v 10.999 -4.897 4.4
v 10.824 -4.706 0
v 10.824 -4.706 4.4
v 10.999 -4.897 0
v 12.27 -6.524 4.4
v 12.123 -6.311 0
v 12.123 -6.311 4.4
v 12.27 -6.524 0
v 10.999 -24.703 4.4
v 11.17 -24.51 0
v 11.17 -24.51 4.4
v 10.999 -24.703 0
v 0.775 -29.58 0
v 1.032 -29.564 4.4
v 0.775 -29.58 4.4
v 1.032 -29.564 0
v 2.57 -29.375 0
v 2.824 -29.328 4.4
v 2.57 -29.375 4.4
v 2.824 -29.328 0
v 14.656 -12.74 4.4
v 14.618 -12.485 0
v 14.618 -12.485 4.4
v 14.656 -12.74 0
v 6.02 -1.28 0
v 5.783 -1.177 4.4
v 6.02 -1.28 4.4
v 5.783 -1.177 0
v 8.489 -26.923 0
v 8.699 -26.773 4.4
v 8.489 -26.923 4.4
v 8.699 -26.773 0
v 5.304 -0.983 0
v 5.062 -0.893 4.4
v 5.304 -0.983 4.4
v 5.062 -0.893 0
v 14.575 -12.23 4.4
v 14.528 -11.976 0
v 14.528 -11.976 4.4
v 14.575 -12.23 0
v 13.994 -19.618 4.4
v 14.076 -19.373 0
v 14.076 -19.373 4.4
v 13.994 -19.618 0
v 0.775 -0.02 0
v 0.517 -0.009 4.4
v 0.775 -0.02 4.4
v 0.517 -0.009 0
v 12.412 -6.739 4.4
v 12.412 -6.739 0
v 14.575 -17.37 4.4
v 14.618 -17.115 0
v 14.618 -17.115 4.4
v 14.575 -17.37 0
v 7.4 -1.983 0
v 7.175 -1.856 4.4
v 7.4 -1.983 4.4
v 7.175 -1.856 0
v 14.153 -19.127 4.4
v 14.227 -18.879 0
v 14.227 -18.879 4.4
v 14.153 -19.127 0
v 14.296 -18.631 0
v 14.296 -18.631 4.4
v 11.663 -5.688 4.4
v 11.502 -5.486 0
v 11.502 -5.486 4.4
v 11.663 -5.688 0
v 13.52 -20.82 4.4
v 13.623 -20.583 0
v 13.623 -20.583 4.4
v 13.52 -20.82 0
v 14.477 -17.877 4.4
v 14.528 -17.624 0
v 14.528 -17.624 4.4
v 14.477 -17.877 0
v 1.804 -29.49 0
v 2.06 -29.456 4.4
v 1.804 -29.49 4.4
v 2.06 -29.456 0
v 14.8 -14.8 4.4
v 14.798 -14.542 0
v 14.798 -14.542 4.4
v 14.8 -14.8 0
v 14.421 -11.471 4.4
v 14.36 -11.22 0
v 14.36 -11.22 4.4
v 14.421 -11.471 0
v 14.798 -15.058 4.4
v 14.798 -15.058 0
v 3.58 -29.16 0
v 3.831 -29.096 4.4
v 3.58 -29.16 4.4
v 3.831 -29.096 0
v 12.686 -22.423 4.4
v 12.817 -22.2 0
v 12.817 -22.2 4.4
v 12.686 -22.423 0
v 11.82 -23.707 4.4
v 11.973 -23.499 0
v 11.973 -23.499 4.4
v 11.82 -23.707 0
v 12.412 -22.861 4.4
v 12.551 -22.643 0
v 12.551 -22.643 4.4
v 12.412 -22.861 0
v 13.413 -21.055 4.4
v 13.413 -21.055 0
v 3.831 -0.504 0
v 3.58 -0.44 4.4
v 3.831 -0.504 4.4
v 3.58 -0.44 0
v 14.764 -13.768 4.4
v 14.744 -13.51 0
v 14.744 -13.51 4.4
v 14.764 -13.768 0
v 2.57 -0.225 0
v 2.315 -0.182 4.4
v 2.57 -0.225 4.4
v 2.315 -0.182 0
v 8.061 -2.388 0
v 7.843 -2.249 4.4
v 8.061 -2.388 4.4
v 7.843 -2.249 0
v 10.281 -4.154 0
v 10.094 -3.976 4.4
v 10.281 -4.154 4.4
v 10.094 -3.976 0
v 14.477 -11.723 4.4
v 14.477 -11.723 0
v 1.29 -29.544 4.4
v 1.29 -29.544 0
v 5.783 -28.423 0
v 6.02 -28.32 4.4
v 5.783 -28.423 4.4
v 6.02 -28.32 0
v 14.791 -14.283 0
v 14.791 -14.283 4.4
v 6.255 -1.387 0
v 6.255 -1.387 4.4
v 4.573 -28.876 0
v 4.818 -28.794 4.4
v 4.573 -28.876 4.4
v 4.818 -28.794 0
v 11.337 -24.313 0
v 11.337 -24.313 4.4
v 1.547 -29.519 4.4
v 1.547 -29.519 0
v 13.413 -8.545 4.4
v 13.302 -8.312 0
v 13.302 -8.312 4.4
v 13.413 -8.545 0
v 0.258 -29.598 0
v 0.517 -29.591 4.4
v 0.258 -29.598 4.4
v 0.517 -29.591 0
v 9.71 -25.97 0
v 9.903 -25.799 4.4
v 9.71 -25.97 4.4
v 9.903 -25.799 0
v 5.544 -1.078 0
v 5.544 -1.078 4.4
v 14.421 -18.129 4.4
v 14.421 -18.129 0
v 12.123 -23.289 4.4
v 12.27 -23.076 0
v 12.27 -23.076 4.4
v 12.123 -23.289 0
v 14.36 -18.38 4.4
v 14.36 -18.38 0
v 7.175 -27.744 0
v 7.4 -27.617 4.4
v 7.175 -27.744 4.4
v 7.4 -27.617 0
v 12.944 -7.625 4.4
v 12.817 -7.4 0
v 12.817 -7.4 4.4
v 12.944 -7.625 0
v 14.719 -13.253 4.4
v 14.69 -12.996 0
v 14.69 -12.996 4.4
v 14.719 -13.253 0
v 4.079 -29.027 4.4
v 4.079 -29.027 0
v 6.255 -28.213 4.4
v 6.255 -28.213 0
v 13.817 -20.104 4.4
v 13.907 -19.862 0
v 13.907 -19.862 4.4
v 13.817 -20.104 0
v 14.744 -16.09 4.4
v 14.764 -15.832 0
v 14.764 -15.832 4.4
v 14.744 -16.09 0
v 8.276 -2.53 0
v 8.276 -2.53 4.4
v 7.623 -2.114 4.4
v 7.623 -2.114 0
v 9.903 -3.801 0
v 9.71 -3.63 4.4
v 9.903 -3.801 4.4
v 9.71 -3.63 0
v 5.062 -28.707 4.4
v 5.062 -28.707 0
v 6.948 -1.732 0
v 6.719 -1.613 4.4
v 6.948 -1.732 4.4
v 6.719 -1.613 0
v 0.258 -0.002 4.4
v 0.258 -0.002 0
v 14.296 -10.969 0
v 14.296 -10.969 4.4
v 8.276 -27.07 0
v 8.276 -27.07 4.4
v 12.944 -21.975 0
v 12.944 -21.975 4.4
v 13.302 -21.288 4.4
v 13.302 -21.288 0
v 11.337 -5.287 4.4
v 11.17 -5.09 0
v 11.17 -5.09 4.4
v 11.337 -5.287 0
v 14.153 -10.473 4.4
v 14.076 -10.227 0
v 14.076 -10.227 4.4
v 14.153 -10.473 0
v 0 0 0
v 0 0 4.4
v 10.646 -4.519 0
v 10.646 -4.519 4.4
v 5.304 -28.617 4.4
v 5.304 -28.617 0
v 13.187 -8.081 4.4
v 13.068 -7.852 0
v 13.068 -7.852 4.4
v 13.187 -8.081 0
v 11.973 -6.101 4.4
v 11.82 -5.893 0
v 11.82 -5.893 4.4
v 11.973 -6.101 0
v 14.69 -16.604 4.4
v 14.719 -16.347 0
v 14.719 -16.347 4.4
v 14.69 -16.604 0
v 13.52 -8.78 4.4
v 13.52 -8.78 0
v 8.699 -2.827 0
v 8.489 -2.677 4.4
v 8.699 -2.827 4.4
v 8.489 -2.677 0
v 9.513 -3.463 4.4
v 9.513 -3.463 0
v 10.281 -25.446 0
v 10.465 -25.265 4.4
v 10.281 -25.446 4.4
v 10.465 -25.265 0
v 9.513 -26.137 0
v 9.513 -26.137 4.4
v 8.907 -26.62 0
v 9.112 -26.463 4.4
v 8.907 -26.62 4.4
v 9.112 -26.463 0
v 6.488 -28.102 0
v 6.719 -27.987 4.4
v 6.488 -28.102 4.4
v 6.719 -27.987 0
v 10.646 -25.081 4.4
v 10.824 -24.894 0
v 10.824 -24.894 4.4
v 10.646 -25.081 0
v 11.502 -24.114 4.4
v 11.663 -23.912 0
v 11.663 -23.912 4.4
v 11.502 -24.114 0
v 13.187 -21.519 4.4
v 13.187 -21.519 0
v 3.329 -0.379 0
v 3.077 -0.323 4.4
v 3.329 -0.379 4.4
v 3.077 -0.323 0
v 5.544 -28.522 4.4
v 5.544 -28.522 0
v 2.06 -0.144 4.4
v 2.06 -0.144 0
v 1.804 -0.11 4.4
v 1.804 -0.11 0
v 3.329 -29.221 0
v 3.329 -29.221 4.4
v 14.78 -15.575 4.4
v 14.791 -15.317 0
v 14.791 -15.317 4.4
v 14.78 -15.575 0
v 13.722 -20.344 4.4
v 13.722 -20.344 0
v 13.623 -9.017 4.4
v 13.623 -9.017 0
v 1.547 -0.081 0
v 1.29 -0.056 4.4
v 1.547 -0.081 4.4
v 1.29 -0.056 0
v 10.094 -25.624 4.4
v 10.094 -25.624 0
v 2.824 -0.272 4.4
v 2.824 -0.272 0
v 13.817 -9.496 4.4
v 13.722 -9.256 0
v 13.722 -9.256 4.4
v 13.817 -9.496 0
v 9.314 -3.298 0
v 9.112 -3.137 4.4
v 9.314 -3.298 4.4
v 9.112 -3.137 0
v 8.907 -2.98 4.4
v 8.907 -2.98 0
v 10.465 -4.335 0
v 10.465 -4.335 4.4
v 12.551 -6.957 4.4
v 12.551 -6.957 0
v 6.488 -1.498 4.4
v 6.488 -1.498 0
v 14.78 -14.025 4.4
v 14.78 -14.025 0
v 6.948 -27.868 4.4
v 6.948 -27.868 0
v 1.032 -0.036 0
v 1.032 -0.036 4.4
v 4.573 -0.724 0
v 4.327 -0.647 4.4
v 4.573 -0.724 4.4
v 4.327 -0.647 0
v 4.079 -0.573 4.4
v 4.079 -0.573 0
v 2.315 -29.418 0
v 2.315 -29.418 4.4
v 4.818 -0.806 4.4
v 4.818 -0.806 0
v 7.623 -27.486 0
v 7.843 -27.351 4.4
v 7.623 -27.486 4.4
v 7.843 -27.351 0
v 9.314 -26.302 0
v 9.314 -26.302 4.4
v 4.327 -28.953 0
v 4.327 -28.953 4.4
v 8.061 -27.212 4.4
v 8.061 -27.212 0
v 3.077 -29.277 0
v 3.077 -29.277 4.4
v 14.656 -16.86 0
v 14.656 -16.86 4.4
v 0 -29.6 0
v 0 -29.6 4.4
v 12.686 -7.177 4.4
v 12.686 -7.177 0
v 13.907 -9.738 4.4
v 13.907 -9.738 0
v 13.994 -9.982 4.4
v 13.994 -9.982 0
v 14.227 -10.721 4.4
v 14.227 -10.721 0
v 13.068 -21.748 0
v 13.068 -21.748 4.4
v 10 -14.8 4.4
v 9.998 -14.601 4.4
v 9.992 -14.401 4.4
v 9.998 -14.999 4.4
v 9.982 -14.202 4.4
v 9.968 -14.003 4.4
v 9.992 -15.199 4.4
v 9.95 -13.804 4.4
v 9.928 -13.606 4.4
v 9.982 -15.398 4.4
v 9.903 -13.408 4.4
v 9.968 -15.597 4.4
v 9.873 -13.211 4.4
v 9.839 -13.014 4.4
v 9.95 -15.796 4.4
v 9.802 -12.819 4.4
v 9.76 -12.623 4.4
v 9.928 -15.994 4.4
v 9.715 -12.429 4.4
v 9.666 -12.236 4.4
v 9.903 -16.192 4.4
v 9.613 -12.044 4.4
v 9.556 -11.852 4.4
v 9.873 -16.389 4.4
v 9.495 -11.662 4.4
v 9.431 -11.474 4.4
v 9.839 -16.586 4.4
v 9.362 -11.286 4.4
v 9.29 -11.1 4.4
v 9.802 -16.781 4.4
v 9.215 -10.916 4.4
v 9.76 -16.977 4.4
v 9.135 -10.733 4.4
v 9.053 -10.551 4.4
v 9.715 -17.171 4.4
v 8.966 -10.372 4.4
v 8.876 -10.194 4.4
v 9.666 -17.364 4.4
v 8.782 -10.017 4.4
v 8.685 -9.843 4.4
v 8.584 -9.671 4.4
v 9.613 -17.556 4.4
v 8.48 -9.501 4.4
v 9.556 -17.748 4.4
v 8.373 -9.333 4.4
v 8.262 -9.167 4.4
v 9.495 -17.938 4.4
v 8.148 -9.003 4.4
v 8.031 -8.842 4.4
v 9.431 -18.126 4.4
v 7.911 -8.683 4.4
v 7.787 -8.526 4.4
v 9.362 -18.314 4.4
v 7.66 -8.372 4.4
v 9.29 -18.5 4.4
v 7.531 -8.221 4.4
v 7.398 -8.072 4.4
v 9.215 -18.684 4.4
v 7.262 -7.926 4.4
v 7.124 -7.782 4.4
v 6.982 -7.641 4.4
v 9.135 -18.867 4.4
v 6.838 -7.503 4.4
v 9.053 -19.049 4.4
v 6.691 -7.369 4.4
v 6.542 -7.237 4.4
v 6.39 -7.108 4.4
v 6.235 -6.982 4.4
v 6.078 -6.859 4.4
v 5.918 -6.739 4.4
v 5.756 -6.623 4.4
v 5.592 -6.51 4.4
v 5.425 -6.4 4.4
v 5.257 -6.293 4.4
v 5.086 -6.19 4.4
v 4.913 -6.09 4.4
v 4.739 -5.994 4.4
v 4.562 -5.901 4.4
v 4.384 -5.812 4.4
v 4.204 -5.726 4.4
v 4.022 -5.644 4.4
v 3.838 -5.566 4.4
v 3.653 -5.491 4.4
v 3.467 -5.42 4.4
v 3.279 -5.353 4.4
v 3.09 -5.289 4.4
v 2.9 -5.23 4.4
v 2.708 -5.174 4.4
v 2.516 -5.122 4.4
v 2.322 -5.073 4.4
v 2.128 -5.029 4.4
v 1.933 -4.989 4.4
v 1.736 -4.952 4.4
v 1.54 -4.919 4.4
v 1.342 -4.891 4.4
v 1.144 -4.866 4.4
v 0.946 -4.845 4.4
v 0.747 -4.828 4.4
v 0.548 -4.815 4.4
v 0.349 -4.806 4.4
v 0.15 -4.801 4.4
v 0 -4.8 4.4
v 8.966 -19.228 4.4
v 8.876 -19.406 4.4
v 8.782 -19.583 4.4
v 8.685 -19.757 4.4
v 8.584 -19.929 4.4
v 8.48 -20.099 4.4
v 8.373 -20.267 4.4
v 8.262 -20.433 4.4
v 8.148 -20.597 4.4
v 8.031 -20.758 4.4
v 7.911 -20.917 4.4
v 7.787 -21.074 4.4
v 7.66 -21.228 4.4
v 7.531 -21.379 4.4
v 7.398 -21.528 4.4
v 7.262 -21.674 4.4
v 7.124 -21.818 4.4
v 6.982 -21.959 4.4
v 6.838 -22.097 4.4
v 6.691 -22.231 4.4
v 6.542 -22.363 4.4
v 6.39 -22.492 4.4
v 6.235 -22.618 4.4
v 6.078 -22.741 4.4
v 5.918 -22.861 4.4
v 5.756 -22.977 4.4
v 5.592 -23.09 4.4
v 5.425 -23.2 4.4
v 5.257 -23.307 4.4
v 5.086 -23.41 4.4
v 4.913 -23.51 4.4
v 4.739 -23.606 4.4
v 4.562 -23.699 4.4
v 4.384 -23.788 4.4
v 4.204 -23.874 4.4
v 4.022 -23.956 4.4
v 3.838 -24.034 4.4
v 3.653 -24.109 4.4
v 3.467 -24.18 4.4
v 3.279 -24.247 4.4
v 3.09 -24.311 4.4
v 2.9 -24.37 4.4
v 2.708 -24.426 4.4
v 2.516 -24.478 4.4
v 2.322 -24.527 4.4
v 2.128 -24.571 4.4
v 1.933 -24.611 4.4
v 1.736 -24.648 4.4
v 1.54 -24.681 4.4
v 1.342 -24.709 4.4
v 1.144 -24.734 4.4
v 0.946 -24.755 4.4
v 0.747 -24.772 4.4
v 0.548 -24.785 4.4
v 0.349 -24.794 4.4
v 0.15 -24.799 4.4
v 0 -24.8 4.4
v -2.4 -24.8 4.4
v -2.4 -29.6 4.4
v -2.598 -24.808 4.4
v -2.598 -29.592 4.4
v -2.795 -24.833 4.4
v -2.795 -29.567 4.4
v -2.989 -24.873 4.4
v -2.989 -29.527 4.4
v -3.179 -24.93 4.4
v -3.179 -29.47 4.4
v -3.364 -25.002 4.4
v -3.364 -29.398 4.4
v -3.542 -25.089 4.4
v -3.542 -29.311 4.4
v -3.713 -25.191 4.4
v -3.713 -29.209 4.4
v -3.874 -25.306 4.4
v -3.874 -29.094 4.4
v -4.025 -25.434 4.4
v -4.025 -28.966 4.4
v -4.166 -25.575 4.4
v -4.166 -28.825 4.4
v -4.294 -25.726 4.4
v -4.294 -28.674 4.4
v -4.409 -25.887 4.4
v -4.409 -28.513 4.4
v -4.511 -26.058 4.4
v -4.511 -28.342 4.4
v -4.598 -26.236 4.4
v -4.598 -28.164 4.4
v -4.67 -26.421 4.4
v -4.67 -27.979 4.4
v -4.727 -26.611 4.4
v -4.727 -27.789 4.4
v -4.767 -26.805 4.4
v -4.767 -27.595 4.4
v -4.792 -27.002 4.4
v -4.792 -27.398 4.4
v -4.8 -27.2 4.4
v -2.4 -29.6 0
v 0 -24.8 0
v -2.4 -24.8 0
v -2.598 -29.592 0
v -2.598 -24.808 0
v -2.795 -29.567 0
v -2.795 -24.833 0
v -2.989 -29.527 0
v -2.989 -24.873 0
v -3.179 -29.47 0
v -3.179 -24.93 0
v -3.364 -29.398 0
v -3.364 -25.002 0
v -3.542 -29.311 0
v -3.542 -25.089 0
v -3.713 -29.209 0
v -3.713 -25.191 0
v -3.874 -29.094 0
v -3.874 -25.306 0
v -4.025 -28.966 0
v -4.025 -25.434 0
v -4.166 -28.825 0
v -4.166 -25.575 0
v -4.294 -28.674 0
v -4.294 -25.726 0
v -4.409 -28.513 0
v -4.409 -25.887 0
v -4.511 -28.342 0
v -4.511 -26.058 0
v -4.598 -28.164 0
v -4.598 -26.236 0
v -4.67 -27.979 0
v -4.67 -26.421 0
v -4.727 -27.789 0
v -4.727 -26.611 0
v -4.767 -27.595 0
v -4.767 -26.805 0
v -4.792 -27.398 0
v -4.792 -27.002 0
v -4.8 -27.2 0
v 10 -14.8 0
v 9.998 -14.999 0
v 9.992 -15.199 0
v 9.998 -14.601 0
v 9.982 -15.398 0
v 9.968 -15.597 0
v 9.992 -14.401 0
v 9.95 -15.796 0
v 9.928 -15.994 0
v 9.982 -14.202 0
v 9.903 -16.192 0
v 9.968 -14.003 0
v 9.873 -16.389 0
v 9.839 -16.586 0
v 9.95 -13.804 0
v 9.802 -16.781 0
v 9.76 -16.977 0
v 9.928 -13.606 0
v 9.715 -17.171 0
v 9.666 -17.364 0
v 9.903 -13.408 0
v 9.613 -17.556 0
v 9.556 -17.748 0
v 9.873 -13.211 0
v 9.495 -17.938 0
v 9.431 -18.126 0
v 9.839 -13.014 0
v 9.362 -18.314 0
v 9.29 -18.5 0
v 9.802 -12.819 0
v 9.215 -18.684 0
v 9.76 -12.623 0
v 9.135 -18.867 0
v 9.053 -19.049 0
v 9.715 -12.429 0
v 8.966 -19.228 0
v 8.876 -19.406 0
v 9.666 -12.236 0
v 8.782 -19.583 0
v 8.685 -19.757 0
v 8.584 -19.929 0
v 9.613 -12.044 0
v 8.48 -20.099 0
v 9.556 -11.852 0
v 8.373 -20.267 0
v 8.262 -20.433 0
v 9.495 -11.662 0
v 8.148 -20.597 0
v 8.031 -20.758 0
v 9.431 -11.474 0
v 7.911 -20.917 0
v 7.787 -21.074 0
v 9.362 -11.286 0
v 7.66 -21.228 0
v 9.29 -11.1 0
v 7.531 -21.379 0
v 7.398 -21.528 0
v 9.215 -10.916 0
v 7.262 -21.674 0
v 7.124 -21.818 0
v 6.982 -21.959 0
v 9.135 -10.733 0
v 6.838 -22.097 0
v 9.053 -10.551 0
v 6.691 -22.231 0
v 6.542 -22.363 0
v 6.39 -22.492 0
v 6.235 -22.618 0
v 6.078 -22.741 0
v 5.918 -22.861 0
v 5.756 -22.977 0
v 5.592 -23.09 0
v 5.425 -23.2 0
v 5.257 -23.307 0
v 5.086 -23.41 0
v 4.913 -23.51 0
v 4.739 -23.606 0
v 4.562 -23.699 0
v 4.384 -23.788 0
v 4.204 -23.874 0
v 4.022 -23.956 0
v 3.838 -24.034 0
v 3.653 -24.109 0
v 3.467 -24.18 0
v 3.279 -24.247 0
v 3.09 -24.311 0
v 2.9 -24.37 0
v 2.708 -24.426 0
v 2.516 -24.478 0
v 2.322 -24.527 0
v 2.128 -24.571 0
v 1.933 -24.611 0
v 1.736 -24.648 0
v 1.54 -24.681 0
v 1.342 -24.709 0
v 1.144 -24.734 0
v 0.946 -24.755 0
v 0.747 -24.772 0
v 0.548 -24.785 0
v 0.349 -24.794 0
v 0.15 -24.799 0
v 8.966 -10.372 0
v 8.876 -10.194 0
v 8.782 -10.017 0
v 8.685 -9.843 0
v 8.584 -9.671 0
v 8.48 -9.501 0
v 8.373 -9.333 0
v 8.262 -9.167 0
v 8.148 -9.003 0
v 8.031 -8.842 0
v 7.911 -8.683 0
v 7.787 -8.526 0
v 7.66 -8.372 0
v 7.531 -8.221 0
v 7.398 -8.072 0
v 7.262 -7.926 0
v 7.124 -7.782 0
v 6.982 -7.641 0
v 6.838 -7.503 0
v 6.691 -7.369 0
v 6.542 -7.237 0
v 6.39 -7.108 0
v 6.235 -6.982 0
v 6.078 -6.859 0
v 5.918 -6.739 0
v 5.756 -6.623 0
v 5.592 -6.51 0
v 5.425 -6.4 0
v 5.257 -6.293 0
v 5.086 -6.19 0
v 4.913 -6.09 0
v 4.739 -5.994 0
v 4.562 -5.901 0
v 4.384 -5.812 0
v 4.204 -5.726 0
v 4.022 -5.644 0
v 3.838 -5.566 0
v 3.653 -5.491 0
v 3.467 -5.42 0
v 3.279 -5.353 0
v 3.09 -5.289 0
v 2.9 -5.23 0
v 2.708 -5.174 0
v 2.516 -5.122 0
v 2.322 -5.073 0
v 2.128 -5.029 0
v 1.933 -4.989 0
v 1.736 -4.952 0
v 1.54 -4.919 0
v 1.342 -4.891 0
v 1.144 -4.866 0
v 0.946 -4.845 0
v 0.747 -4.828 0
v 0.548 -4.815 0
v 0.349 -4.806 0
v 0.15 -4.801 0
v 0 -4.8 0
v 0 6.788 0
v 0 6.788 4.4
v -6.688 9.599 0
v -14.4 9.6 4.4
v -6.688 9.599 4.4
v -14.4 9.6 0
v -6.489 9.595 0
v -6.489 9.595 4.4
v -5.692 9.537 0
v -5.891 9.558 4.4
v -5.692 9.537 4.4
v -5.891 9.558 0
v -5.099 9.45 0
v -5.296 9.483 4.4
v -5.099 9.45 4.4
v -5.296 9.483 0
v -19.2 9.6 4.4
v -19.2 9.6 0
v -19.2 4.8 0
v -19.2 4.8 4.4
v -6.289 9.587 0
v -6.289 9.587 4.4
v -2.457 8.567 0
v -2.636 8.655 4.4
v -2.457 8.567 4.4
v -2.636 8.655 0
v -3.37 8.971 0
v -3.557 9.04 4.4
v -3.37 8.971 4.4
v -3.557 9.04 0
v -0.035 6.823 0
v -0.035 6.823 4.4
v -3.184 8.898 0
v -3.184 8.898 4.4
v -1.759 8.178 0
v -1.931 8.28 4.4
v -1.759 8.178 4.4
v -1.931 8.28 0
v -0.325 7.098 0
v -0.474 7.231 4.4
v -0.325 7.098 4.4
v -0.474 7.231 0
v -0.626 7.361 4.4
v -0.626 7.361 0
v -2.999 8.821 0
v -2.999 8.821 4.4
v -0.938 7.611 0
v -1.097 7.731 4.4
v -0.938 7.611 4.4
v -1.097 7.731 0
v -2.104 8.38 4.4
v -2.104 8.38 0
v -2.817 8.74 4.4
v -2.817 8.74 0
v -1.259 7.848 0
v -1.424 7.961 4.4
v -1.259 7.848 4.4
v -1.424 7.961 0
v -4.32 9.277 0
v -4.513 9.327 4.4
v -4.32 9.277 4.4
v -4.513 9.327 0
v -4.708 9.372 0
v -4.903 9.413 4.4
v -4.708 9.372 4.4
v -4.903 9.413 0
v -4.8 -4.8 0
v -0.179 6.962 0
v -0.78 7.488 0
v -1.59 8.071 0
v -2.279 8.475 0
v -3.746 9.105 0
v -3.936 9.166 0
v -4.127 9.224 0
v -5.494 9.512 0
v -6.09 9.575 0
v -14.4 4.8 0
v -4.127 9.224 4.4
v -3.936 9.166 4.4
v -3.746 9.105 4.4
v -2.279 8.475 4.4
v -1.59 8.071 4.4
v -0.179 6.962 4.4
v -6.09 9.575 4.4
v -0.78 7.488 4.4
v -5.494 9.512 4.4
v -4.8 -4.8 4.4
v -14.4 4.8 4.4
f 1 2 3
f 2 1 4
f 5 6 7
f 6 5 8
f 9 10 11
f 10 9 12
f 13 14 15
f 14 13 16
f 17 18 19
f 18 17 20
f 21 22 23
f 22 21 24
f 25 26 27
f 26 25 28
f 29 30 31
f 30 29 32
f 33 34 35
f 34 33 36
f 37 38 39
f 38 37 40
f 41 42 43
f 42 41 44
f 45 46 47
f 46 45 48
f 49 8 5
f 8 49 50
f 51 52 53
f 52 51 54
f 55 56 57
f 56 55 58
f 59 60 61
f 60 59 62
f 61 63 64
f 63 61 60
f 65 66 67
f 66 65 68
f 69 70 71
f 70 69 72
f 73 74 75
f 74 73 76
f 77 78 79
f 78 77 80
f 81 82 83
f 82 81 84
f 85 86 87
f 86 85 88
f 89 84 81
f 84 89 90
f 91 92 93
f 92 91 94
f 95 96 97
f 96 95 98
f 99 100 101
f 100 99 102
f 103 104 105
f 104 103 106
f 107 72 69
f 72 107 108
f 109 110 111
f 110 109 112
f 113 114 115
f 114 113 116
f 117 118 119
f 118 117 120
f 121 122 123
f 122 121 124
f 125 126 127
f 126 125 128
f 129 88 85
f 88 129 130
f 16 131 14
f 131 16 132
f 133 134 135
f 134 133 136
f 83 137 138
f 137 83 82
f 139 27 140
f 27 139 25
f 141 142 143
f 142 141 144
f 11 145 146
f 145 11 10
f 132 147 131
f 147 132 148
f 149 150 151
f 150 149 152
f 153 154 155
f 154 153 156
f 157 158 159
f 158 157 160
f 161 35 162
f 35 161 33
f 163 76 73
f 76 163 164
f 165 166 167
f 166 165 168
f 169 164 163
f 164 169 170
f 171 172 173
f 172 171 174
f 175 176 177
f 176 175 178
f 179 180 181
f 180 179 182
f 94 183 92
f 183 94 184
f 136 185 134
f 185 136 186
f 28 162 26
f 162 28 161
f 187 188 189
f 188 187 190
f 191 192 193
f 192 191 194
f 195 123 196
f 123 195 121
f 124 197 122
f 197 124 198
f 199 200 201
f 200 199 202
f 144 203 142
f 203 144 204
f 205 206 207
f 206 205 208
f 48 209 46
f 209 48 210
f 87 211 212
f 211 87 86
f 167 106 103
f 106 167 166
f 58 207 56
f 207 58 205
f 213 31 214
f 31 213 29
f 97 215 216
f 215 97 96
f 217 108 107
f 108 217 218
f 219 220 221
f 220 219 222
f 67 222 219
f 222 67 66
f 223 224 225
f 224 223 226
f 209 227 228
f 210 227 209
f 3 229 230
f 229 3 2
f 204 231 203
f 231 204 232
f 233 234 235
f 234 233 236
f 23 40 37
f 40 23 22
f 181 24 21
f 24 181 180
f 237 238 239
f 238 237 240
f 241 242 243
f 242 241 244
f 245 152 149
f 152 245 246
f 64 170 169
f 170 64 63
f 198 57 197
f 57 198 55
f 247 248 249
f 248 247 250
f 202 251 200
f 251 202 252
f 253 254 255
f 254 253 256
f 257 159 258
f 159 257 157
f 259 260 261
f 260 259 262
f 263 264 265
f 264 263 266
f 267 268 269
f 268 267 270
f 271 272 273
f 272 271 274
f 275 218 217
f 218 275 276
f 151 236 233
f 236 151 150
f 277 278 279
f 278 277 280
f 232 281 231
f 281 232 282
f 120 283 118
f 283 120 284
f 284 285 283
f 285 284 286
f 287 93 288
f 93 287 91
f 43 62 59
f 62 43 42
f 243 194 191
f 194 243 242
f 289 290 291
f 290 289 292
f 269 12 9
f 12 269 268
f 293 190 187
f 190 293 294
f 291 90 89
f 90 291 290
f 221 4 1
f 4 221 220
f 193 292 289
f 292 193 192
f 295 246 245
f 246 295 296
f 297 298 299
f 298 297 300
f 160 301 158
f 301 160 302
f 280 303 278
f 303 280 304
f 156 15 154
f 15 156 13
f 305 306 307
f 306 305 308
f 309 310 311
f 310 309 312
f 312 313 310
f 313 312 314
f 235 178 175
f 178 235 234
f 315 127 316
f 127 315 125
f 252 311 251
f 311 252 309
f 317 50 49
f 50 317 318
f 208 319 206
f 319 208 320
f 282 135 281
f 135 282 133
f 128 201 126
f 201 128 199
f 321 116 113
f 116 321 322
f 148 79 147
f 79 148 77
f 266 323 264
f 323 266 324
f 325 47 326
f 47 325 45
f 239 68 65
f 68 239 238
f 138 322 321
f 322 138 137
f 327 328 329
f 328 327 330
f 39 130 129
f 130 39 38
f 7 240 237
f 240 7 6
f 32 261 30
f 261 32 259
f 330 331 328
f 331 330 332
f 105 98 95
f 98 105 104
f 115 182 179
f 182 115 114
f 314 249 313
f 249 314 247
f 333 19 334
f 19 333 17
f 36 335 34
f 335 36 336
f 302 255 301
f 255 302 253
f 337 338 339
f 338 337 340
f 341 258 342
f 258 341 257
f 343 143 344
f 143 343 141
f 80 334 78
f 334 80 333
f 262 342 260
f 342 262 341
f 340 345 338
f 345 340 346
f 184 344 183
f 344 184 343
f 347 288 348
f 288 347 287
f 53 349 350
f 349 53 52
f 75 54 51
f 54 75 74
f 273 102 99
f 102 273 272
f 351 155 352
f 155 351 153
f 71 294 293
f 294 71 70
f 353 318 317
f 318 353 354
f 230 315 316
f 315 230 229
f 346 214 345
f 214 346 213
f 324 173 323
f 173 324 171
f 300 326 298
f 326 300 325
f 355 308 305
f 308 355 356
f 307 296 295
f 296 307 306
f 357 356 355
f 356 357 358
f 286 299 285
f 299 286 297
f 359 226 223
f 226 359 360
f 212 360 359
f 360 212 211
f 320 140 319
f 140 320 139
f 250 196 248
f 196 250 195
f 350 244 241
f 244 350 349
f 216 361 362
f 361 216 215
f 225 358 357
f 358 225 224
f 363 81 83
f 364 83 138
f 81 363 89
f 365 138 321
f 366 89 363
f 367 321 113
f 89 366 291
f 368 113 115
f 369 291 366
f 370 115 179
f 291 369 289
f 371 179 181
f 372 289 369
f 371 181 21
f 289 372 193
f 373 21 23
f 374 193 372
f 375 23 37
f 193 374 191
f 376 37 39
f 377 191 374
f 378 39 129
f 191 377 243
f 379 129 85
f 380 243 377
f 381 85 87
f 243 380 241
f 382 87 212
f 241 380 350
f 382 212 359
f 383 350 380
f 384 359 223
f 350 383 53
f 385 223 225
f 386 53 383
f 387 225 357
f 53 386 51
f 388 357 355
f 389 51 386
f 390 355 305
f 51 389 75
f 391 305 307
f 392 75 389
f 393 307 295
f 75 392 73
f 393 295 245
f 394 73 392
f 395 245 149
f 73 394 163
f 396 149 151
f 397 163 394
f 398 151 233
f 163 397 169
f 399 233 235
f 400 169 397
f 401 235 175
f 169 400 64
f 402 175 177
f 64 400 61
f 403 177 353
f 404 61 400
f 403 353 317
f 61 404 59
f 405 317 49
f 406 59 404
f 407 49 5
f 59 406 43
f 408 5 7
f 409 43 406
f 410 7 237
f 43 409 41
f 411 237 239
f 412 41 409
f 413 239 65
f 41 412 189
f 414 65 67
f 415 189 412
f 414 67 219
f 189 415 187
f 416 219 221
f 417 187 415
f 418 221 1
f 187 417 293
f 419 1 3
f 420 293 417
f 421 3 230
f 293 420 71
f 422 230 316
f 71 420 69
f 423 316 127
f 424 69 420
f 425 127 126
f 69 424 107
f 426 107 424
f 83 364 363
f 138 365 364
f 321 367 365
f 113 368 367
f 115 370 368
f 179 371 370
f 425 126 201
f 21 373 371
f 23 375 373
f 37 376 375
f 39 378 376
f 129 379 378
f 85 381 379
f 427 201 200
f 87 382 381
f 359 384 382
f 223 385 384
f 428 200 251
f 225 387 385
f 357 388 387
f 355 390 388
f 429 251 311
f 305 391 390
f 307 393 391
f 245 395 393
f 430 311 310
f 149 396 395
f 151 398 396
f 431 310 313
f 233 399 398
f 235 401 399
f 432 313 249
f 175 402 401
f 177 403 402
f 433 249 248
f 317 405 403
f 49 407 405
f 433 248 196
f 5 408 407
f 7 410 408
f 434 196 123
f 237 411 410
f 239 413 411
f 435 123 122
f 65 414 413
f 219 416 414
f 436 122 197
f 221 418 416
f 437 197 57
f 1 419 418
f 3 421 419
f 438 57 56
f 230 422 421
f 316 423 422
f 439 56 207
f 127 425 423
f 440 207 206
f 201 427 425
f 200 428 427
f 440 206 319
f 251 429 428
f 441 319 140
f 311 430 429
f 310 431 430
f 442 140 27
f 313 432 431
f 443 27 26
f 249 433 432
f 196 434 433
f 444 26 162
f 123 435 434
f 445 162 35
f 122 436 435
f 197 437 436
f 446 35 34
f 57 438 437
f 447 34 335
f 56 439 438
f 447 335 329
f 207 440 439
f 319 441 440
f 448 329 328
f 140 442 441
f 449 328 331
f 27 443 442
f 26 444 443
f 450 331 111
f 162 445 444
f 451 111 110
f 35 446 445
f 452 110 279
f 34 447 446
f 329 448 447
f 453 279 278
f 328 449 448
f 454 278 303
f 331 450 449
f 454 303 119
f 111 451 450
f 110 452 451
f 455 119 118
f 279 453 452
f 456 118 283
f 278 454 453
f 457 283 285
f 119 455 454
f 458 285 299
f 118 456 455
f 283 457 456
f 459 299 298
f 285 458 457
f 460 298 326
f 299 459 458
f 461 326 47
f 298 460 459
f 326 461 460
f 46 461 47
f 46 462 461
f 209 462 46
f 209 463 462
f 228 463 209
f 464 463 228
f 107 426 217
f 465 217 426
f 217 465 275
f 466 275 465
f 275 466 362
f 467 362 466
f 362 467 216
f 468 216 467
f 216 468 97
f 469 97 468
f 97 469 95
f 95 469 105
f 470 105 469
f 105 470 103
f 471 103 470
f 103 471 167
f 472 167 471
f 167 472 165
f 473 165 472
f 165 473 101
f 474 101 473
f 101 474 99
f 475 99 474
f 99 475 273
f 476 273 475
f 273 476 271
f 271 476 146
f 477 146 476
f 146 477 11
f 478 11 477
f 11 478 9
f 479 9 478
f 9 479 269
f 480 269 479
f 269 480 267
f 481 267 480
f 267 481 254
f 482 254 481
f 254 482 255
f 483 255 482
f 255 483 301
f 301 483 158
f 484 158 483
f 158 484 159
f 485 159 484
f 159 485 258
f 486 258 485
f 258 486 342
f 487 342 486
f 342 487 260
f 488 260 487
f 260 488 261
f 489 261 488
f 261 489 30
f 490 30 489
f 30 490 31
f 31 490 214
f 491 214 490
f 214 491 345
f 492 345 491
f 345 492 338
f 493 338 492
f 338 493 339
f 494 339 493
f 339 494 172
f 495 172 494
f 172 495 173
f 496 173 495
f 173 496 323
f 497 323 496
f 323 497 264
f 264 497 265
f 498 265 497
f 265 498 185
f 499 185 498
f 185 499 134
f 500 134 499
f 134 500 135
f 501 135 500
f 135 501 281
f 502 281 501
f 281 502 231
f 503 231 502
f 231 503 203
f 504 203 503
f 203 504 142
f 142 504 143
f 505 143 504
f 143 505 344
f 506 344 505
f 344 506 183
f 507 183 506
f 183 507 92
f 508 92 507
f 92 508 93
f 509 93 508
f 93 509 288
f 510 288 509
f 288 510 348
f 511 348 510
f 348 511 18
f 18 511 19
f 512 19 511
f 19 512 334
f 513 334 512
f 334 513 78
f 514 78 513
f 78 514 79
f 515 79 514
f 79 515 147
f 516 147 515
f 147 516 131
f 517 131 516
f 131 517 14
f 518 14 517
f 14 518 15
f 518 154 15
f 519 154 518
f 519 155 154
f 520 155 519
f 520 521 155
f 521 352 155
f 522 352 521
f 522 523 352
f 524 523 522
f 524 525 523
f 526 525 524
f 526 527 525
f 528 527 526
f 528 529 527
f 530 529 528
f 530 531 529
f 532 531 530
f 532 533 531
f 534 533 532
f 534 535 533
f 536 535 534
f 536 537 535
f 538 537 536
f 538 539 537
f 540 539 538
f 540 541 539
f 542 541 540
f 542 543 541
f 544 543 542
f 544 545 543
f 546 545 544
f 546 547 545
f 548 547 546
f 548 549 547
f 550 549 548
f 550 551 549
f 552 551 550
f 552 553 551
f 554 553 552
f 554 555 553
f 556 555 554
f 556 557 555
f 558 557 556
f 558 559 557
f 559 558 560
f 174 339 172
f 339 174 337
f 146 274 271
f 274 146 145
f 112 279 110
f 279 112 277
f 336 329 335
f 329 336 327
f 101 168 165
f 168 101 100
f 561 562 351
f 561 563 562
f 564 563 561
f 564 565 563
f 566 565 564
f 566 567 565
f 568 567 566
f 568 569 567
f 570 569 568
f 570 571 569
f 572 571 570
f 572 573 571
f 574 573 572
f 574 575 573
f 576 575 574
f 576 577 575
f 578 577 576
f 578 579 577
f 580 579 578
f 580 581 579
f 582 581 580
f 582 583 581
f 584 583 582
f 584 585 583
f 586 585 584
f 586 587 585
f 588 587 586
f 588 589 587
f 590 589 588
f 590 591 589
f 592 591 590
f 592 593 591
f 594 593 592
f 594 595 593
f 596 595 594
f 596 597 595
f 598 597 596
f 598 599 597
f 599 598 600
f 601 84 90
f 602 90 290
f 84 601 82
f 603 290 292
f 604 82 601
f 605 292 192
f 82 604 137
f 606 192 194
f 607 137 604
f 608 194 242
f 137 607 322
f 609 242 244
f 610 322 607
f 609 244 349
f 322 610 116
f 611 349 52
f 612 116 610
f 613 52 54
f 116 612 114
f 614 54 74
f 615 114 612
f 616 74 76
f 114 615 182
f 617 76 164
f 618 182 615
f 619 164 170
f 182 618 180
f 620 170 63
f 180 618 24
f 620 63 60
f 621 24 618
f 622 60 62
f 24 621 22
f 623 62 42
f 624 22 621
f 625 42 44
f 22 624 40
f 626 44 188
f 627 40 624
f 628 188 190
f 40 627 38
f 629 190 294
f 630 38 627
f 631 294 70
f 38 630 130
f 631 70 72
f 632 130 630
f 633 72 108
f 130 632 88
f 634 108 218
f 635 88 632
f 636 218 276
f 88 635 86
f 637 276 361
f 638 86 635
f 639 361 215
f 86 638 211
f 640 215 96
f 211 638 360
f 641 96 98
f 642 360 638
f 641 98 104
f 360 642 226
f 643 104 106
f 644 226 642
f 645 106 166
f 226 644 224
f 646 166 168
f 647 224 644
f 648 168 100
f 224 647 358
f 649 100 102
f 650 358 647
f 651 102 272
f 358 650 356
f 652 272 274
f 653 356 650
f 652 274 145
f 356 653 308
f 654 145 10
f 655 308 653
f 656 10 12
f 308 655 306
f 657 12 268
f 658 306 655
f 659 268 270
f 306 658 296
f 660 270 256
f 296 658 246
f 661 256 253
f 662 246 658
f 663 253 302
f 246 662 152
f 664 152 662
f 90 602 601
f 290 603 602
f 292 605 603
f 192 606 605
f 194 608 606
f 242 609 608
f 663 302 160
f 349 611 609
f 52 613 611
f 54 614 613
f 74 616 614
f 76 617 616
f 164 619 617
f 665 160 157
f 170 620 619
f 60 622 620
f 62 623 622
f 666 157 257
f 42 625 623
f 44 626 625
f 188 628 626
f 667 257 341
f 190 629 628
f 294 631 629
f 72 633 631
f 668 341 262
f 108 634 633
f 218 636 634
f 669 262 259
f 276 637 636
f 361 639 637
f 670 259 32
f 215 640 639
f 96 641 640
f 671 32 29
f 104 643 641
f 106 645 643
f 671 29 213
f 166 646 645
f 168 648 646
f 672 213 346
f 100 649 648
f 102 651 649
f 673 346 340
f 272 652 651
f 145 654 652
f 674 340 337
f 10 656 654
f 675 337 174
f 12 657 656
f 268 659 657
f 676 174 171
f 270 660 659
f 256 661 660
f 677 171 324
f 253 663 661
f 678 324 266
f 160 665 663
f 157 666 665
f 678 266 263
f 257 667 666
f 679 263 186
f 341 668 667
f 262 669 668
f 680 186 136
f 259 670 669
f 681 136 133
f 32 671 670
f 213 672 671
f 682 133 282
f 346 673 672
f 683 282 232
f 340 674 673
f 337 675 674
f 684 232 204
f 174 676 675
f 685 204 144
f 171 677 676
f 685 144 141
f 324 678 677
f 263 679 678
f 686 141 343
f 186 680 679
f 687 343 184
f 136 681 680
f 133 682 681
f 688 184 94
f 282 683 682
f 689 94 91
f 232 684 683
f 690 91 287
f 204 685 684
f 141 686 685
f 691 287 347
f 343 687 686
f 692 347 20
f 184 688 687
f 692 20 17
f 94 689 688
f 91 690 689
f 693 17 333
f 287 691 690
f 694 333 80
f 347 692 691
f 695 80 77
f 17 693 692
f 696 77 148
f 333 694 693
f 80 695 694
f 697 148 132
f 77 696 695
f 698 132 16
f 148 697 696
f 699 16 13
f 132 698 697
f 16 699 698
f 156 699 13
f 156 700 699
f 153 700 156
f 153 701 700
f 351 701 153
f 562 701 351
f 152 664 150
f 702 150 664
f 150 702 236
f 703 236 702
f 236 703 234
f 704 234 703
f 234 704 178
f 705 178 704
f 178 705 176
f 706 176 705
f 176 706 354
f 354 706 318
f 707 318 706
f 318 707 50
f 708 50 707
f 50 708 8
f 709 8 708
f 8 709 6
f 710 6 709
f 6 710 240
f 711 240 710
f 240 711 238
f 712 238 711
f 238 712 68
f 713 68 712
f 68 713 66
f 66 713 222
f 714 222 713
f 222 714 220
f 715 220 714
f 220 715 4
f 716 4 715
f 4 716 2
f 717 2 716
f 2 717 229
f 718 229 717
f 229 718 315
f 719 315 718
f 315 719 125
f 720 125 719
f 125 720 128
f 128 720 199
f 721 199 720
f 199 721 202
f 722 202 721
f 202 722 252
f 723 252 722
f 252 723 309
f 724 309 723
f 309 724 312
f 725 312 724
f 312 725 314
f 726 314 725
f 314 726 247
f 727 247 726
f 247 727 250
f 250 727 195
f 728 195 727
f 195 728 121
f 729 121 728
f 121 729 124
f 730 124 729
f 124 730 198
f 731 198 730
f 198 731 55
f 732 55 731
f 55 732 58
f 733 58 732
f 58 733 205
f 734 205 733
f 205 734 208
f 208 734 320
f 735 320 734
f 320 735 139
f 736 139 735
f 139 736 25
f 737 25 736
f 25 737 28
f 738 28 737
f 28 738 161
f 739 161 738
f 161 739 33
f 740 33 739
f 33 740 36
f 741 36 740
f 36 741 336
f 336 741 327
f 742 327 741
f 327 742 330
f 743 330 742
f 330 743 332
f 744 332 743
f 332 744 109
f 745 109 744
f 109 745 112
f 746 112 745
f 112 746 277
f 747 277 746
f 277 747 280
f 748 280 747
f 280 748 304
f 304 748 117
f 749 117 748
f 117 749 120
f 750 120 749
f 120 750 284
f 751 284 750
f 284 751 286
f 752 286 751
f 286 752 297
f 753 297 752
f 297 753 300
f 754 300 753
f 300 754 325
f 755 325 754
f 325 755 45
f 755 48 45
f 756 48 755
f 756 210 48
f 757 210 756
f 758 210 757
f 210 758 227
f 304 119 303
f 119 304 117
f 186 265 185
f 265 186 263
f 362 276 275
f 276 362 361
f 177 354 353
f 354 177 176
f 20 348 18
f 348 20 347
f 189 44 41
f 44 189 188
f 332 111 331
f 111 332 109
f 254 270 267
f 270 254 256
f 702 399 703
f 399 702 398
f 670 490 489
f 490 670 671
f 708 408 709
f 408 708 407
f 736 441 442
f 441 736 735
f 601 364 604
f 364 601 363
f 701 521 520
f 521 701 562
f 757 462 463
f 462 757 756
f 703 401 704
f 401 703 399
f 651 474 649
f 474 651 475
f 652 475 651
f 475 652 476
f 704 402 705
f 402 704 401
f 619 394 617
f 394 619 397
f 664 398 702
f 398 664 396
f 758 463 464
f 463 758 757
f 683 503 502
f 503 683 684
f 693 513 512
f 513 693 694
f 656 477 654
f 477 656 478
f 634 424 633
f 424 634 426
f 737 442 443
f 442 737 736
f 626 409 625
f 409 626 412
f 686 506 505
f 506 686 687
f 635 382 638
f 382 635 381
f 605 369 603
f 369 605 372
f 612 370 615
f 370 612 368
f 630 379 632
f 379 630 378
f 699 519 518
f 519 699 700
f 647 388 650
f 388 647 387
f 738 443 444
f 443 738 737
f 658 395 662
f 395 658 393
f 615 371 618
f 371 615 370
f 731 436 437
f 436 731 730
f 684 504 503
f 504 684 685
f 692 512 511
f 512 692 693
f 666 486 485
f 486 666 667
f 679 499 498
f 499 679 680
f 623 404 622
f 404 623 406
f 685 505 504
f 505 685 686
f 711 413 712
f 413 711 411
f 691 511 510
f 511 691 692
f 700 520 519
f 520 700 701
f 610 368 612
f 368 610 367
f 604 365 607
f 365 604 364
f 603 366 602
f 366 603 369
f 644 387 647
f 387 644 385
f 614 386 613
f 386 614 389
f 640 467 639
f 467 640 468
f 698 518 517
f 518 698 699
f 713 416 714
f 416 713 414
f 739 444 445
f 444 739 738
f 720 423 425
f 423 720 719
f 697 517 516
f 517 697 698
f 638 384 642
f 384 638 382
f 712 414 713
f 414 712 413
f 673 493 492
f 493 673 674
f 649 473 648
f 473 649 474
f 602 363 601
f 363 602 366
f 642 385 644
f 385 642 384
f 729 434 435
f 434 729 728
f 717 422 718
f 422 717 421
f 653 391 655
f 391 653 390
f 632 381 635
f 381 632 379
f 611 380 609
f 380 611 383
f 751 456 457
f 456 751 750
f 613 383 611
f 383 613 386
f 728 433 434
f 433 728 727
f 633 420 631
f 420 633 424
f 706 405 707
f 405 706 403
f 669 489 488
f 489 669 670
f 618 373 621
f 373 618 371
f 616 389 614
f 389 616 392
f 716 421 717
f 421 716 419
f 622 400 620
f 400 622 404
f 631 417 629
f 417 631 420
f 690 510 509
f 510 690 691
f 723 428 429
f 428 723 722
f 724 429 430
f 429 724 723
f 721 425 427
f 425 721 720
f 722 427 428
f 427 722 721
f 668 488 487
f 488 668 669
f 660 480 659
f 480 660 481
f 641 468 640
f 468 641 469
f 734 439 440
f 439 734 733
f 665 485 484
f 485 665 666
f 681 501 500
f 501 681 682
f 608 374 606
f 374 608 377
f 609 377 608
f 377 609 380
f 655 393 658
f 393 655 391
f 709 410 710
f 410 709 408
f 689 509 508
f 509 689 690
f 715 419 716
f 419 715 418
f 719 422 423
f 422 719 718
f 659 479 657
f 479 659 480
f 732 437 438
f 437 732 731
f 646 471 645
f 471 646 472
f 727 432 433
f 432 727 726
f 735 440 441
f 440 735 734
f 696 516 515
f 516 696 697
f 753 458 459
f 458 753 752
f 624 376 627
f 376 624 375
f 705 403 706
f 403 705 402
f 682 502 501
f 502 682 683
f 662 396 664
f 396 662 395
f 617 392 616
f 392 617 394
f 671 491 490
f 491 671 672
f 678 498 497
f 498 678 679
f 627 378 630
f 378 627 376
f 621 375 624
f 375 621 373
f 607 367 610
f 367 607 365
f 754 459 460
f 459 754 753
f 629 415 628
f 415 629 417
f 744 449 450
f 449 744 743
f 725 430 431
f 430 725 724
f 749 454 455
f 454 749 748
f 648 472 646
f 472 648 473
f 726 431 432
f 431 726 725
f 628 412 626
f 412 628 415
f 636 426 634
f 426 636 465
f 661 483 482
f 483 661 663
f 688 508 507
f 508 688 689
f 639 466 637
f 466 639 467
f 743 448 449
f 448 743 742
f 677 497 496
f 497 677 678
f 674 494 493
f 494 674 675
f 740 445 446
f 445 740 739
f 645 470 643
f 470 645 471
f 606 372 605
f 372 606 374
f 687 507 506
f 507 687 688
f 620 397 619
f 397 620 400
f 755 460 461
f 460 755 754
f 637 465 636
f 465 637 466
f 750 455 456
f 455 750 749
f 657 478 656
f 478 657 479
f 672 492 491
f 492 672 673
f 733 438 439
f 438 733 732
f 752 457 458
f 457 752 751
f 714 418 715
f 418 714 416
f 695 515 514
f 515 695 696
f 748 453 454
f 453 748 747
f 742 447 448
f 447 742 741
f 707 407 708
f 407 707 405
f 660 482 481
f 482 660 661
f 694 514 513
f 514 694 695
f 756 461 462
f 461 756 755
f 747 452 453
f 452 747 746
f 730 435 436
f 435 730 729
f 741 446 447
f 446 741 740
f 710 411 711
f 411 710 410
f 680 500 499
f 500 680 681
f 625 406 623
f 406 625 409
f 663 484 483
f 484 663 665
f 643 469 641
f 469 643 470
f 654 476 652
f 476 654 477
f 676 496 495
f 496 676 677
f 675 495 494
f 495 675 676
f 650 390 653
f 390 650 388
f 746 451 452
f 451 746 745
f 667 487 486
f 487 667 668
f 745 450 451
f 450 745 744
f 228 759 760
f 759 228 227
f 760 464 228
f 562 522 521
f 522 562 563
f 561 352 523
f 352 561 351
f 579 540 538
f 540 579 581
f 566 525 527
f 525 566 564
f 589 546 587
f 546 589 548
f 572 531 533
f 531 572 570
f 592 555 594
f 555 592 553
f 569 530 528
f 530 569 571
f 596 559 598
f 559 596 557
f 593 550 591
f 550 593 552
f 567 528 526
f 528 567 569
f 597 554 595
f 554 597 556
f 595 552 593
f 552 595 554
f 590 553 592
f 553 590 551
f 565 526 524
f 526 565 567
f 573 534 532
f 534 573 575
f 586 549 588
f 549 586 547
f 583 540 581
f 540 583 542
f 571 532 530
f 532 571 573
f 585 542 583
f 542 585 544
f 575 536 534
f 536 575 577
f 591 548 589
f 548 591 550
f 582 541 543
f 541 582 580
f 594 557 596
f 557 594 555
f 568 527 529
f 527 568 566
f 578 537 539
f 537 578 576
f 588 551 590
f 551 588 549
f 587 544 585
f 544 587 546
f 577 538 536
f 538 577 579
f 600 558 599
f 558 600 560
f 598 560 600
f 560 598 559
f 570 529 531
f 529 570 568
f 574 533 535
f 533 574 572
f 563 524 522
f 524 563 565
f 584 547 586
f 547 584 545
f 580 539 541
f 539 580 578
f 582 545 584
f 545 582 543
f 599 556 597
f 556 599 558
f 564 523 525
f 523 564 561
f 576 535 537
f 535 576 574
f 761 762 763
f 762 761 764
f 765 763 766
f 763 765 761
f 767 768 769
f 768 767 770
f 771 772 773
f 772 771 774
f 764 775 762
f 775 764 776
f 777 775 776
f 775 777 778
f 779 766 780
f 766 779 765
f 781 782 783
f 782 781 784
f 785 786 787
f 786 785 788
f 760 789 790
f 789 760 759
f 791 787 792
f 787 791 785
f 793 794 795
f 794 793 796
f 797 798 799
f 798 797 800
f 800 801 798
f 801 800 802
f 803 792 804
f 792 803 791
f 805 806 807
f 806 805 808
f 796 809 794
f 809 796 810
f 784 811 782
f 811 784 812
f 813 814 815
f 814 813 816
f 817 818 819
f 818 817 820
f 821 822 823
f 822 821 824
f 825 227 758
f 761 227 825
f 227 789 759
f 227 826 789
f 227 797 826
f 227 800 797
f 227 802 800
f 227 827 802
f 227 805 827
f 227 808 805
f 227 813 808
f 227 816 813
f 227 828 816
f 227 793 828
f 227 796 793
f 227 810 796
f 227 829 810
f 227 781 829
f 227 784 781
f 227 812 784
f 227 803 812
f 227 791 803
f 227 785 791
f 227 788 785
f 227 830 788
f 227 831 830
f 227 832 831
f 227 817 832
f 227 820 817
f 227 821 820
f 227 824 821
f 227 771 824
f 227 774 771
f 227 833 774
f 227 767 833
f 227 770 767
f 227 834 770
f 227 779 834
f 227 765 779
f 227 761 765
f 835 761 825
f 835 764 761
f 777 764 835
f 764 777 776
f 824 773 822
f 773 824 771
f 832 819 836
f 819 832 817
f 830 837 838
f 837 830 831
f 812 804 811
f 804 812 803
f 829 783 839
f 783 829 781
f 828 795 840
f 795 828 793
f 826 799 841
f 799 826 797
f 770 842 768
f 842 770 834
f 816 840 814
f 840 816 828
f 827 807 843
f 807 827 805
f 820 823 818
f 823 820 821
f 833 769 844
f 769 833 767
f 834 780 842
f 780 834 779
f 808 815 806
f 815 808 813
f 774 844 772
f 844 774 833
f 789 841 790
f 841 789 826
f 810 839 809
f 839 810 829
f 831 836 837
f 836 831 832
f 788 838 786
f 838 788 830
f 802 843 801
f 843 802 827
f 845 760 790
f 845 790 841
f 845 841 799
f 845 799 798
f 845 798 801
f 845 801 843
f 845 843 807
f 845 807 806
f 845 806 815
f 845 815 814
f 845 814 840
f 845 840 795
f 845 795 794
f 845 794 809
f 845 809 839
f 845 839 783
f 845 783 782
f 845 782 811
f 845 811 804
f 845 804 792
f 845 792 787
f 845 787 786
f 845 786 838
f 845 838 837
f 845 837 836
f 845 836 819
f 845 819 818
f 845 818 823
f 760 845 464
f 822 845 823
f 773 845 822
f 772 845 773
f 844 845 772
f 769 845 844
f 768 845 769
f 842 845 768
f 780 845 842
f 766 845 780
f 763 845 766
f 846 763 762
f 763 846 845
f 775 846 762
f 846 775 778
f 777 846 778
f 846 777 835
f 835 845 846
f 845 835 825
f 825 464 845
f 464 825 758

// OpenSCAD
// Include the file where the accessory modules are defined
include <ikea_skadis.scad>

/* [Accessory selector] */
selector = "skadis_curved_hook"; // [skadis_curved_hook, skadis_squared_hook, skadis_straight_hook, skadis_o_holder, skadis_u_holder, skadis_squared_holder, skadis_plier, skadis_plate, skadis_round_plate, skadis_box, skadis_round_box, skadis_rack, skadis_bits_serie]

/* [Global parameters] */
all_pegs = false; // [false,true]
fullfill = true; // [false,true]
retainer = false; // [false,true]
nozzle_width = 0.4;
tolerance = 0.6;

/* [skadis_curved_hook parameters] */
// Diameter
skadis_curved_hook_diamter = 20;

/* [skadis_squared_hook parameters] */
skadis_squared_hook_length = 10;
skadis_squared_hook_height = 30;

/* [skadis_straight_hook parameters] */
skadis_straight_hook_length = 60;

/* [skadis_o_holder parameters] */
skadis_o_holder_diameter = 16;

/* [skadis_u_holder parameters] */
skadis_u_holder_diameter = 16;

/* [skadis_squared_holder parameters] */
skadis_squared_holder_lenght = 60;
skadis_squared_holder_width = 20;

/* [skadis_plier parameters] */
skadis_plier_length = 30;
skadis_plier_width = 18;
skadis_plier_filet = 6;

/* [skadis_plate parameters] */
skadis_plate_lenght = 80;
skadis_plate_width = 60;

/* [skadis_round_plate parameters] */
skadis_round_plate_diameter = 80;

/* [skadis_box parameters] */
skadis_box_length = 60;
skadis_box_width = 40;
skadis_box_height = 30;
skadis_box_filet = 6;

/* [skadis_round_box parameters] */
skadis_round_box_diameter = 30;
skadis_round_box_height = 40;

/* [skadis_rack parameters] */
skadis_rack_diameter_default = undef;
skadis_rack_diameter1 = 6;
skadis_rack_diameter2 = 22;
skadis_rack_number_of_units = 6;
skadis_rack_compact = false;

/* [skadis_bits_serie parameters] */
skadis_bits_serie_height = 22;
skadis_bits_serie_diameter = 8;
skadis_bits_serie_step = 2;
skadis_bits_serie_number_of_bits = 12;
skadis_bits_serie_number_of_facets = 36;
skadis_bits_serie_angle = 0;
skadis_bits_serie_bottom = true;
skadis_bits_serie_tolerance1 = 0.6;
skadis_bits_serie_tolerance2 = 0.6;
skadis_bits_serie_compact = false;

// Check each accessory option and call the corresponding module
module render_accessory(selector) {
    if (selector == "skadis_curved_hook") {
      skadis_curved_hook(skadis_curved_hook_diamter,
                         fullfill,
                         retainer);
    } else if (selector == "skadis_squared_hook") {
      skadis_squared_hook(skadis_squared_hook_length,
                          skadis_squared_hook_height,
                          fullfill,
                          retainer);
    } else if (selector == "skadis_straight_hook") {
      skadis_straight_hook(skadis_straight_hook_length,
                           fullfill,
                           retainer);
    } else if (selector == "skadis_o_holder") {
      skadis_o_holder(skadis_o_holder_diameter,
                      all_pegs,
                      fullfill,
                      retainer);
    } else if (selector == "skadis_u_holder") {
      skadis_u_holder(skadis_u_holder_diameter,
                      all_pegs,
                      fullfill,
                      retainer);
    } else if (selector == "skadis_squared_holder") {
      skadis_squared_holder(skadis_squared_holder_lenght,
                            skadis_squared_holder_width,
                            all_pegs,
                            fullfill,
                            retainer);
    } else if (selector == "skadis_plier") {
      skadis_plier(skadis_plier_length,
                   skadis_plier_width,
                   skadis_plier_filet,
                   all_pegs,
                   fullfill,
                   retainer);
    } else if (selector == "skadis_plate") {
      skadis_plate(skadis_plate_lenght,
                   skadis_plate_width,
                   all_pegs,
                   fullfill,
                   retainer);
    } else if (selector == "skadis_round_plate") {
      skadis_round_plate(skadis_round_plate_diameter,
                         all_pegs,
                         fullfill,
                         retainer);
    } else if (selector == "skadis_box") {
      skadis_box(skadis_box_length,
                 skadis_box_width,
                 skadis_box_height,
                 tolerance,
                 skadis_box_filet,
                 all_pegs,
                 fullfill,
                 retainer);
    } else if (selector == "skadis_round_box") {
      skadis_round_box(skadis_round_box_diameter,
                       skadis_round_box_height,
                       tolerance,
                       all_pegs,
                       fullfill,
                       retainer);
    } else if (selector == "skadis_rack") {
      skadis_rack(skadis_rack_diameter_default,
                  skadis_rack_diameter1,
                  skadis_rack_diameter2,
                  skadis_rack_number_of_units,
                  skadis_rack_compact,
                  all_pegs,
                  fullfill,
                  retainer);
    } else if (selector == "skadis_bits_serie") {
      skadis_bits_serie(skadis_bits_serie_height,
                        skadis_bits_serie_diameter,
                        skadis_bits_serie_step,
                        skadis_bits_serie_number_of_bits,
                        skadis_bits_serie_number_of_facets,
                        skadis_bits_serie_angle,
                        skadis_bits_serie_bottom,
                        skadis_bits_serie_tolerance1,
                        skadis_bits_serie_tolerance2,
                        skadis_bits_serie_compact,
                        all_pegs,
                        fullfill,
                        retainer);
    } else {
      echo("Invalid accessory selector:", selector);
    }
}

// Call the module to render the selected accessory
render_accessory(selector);
